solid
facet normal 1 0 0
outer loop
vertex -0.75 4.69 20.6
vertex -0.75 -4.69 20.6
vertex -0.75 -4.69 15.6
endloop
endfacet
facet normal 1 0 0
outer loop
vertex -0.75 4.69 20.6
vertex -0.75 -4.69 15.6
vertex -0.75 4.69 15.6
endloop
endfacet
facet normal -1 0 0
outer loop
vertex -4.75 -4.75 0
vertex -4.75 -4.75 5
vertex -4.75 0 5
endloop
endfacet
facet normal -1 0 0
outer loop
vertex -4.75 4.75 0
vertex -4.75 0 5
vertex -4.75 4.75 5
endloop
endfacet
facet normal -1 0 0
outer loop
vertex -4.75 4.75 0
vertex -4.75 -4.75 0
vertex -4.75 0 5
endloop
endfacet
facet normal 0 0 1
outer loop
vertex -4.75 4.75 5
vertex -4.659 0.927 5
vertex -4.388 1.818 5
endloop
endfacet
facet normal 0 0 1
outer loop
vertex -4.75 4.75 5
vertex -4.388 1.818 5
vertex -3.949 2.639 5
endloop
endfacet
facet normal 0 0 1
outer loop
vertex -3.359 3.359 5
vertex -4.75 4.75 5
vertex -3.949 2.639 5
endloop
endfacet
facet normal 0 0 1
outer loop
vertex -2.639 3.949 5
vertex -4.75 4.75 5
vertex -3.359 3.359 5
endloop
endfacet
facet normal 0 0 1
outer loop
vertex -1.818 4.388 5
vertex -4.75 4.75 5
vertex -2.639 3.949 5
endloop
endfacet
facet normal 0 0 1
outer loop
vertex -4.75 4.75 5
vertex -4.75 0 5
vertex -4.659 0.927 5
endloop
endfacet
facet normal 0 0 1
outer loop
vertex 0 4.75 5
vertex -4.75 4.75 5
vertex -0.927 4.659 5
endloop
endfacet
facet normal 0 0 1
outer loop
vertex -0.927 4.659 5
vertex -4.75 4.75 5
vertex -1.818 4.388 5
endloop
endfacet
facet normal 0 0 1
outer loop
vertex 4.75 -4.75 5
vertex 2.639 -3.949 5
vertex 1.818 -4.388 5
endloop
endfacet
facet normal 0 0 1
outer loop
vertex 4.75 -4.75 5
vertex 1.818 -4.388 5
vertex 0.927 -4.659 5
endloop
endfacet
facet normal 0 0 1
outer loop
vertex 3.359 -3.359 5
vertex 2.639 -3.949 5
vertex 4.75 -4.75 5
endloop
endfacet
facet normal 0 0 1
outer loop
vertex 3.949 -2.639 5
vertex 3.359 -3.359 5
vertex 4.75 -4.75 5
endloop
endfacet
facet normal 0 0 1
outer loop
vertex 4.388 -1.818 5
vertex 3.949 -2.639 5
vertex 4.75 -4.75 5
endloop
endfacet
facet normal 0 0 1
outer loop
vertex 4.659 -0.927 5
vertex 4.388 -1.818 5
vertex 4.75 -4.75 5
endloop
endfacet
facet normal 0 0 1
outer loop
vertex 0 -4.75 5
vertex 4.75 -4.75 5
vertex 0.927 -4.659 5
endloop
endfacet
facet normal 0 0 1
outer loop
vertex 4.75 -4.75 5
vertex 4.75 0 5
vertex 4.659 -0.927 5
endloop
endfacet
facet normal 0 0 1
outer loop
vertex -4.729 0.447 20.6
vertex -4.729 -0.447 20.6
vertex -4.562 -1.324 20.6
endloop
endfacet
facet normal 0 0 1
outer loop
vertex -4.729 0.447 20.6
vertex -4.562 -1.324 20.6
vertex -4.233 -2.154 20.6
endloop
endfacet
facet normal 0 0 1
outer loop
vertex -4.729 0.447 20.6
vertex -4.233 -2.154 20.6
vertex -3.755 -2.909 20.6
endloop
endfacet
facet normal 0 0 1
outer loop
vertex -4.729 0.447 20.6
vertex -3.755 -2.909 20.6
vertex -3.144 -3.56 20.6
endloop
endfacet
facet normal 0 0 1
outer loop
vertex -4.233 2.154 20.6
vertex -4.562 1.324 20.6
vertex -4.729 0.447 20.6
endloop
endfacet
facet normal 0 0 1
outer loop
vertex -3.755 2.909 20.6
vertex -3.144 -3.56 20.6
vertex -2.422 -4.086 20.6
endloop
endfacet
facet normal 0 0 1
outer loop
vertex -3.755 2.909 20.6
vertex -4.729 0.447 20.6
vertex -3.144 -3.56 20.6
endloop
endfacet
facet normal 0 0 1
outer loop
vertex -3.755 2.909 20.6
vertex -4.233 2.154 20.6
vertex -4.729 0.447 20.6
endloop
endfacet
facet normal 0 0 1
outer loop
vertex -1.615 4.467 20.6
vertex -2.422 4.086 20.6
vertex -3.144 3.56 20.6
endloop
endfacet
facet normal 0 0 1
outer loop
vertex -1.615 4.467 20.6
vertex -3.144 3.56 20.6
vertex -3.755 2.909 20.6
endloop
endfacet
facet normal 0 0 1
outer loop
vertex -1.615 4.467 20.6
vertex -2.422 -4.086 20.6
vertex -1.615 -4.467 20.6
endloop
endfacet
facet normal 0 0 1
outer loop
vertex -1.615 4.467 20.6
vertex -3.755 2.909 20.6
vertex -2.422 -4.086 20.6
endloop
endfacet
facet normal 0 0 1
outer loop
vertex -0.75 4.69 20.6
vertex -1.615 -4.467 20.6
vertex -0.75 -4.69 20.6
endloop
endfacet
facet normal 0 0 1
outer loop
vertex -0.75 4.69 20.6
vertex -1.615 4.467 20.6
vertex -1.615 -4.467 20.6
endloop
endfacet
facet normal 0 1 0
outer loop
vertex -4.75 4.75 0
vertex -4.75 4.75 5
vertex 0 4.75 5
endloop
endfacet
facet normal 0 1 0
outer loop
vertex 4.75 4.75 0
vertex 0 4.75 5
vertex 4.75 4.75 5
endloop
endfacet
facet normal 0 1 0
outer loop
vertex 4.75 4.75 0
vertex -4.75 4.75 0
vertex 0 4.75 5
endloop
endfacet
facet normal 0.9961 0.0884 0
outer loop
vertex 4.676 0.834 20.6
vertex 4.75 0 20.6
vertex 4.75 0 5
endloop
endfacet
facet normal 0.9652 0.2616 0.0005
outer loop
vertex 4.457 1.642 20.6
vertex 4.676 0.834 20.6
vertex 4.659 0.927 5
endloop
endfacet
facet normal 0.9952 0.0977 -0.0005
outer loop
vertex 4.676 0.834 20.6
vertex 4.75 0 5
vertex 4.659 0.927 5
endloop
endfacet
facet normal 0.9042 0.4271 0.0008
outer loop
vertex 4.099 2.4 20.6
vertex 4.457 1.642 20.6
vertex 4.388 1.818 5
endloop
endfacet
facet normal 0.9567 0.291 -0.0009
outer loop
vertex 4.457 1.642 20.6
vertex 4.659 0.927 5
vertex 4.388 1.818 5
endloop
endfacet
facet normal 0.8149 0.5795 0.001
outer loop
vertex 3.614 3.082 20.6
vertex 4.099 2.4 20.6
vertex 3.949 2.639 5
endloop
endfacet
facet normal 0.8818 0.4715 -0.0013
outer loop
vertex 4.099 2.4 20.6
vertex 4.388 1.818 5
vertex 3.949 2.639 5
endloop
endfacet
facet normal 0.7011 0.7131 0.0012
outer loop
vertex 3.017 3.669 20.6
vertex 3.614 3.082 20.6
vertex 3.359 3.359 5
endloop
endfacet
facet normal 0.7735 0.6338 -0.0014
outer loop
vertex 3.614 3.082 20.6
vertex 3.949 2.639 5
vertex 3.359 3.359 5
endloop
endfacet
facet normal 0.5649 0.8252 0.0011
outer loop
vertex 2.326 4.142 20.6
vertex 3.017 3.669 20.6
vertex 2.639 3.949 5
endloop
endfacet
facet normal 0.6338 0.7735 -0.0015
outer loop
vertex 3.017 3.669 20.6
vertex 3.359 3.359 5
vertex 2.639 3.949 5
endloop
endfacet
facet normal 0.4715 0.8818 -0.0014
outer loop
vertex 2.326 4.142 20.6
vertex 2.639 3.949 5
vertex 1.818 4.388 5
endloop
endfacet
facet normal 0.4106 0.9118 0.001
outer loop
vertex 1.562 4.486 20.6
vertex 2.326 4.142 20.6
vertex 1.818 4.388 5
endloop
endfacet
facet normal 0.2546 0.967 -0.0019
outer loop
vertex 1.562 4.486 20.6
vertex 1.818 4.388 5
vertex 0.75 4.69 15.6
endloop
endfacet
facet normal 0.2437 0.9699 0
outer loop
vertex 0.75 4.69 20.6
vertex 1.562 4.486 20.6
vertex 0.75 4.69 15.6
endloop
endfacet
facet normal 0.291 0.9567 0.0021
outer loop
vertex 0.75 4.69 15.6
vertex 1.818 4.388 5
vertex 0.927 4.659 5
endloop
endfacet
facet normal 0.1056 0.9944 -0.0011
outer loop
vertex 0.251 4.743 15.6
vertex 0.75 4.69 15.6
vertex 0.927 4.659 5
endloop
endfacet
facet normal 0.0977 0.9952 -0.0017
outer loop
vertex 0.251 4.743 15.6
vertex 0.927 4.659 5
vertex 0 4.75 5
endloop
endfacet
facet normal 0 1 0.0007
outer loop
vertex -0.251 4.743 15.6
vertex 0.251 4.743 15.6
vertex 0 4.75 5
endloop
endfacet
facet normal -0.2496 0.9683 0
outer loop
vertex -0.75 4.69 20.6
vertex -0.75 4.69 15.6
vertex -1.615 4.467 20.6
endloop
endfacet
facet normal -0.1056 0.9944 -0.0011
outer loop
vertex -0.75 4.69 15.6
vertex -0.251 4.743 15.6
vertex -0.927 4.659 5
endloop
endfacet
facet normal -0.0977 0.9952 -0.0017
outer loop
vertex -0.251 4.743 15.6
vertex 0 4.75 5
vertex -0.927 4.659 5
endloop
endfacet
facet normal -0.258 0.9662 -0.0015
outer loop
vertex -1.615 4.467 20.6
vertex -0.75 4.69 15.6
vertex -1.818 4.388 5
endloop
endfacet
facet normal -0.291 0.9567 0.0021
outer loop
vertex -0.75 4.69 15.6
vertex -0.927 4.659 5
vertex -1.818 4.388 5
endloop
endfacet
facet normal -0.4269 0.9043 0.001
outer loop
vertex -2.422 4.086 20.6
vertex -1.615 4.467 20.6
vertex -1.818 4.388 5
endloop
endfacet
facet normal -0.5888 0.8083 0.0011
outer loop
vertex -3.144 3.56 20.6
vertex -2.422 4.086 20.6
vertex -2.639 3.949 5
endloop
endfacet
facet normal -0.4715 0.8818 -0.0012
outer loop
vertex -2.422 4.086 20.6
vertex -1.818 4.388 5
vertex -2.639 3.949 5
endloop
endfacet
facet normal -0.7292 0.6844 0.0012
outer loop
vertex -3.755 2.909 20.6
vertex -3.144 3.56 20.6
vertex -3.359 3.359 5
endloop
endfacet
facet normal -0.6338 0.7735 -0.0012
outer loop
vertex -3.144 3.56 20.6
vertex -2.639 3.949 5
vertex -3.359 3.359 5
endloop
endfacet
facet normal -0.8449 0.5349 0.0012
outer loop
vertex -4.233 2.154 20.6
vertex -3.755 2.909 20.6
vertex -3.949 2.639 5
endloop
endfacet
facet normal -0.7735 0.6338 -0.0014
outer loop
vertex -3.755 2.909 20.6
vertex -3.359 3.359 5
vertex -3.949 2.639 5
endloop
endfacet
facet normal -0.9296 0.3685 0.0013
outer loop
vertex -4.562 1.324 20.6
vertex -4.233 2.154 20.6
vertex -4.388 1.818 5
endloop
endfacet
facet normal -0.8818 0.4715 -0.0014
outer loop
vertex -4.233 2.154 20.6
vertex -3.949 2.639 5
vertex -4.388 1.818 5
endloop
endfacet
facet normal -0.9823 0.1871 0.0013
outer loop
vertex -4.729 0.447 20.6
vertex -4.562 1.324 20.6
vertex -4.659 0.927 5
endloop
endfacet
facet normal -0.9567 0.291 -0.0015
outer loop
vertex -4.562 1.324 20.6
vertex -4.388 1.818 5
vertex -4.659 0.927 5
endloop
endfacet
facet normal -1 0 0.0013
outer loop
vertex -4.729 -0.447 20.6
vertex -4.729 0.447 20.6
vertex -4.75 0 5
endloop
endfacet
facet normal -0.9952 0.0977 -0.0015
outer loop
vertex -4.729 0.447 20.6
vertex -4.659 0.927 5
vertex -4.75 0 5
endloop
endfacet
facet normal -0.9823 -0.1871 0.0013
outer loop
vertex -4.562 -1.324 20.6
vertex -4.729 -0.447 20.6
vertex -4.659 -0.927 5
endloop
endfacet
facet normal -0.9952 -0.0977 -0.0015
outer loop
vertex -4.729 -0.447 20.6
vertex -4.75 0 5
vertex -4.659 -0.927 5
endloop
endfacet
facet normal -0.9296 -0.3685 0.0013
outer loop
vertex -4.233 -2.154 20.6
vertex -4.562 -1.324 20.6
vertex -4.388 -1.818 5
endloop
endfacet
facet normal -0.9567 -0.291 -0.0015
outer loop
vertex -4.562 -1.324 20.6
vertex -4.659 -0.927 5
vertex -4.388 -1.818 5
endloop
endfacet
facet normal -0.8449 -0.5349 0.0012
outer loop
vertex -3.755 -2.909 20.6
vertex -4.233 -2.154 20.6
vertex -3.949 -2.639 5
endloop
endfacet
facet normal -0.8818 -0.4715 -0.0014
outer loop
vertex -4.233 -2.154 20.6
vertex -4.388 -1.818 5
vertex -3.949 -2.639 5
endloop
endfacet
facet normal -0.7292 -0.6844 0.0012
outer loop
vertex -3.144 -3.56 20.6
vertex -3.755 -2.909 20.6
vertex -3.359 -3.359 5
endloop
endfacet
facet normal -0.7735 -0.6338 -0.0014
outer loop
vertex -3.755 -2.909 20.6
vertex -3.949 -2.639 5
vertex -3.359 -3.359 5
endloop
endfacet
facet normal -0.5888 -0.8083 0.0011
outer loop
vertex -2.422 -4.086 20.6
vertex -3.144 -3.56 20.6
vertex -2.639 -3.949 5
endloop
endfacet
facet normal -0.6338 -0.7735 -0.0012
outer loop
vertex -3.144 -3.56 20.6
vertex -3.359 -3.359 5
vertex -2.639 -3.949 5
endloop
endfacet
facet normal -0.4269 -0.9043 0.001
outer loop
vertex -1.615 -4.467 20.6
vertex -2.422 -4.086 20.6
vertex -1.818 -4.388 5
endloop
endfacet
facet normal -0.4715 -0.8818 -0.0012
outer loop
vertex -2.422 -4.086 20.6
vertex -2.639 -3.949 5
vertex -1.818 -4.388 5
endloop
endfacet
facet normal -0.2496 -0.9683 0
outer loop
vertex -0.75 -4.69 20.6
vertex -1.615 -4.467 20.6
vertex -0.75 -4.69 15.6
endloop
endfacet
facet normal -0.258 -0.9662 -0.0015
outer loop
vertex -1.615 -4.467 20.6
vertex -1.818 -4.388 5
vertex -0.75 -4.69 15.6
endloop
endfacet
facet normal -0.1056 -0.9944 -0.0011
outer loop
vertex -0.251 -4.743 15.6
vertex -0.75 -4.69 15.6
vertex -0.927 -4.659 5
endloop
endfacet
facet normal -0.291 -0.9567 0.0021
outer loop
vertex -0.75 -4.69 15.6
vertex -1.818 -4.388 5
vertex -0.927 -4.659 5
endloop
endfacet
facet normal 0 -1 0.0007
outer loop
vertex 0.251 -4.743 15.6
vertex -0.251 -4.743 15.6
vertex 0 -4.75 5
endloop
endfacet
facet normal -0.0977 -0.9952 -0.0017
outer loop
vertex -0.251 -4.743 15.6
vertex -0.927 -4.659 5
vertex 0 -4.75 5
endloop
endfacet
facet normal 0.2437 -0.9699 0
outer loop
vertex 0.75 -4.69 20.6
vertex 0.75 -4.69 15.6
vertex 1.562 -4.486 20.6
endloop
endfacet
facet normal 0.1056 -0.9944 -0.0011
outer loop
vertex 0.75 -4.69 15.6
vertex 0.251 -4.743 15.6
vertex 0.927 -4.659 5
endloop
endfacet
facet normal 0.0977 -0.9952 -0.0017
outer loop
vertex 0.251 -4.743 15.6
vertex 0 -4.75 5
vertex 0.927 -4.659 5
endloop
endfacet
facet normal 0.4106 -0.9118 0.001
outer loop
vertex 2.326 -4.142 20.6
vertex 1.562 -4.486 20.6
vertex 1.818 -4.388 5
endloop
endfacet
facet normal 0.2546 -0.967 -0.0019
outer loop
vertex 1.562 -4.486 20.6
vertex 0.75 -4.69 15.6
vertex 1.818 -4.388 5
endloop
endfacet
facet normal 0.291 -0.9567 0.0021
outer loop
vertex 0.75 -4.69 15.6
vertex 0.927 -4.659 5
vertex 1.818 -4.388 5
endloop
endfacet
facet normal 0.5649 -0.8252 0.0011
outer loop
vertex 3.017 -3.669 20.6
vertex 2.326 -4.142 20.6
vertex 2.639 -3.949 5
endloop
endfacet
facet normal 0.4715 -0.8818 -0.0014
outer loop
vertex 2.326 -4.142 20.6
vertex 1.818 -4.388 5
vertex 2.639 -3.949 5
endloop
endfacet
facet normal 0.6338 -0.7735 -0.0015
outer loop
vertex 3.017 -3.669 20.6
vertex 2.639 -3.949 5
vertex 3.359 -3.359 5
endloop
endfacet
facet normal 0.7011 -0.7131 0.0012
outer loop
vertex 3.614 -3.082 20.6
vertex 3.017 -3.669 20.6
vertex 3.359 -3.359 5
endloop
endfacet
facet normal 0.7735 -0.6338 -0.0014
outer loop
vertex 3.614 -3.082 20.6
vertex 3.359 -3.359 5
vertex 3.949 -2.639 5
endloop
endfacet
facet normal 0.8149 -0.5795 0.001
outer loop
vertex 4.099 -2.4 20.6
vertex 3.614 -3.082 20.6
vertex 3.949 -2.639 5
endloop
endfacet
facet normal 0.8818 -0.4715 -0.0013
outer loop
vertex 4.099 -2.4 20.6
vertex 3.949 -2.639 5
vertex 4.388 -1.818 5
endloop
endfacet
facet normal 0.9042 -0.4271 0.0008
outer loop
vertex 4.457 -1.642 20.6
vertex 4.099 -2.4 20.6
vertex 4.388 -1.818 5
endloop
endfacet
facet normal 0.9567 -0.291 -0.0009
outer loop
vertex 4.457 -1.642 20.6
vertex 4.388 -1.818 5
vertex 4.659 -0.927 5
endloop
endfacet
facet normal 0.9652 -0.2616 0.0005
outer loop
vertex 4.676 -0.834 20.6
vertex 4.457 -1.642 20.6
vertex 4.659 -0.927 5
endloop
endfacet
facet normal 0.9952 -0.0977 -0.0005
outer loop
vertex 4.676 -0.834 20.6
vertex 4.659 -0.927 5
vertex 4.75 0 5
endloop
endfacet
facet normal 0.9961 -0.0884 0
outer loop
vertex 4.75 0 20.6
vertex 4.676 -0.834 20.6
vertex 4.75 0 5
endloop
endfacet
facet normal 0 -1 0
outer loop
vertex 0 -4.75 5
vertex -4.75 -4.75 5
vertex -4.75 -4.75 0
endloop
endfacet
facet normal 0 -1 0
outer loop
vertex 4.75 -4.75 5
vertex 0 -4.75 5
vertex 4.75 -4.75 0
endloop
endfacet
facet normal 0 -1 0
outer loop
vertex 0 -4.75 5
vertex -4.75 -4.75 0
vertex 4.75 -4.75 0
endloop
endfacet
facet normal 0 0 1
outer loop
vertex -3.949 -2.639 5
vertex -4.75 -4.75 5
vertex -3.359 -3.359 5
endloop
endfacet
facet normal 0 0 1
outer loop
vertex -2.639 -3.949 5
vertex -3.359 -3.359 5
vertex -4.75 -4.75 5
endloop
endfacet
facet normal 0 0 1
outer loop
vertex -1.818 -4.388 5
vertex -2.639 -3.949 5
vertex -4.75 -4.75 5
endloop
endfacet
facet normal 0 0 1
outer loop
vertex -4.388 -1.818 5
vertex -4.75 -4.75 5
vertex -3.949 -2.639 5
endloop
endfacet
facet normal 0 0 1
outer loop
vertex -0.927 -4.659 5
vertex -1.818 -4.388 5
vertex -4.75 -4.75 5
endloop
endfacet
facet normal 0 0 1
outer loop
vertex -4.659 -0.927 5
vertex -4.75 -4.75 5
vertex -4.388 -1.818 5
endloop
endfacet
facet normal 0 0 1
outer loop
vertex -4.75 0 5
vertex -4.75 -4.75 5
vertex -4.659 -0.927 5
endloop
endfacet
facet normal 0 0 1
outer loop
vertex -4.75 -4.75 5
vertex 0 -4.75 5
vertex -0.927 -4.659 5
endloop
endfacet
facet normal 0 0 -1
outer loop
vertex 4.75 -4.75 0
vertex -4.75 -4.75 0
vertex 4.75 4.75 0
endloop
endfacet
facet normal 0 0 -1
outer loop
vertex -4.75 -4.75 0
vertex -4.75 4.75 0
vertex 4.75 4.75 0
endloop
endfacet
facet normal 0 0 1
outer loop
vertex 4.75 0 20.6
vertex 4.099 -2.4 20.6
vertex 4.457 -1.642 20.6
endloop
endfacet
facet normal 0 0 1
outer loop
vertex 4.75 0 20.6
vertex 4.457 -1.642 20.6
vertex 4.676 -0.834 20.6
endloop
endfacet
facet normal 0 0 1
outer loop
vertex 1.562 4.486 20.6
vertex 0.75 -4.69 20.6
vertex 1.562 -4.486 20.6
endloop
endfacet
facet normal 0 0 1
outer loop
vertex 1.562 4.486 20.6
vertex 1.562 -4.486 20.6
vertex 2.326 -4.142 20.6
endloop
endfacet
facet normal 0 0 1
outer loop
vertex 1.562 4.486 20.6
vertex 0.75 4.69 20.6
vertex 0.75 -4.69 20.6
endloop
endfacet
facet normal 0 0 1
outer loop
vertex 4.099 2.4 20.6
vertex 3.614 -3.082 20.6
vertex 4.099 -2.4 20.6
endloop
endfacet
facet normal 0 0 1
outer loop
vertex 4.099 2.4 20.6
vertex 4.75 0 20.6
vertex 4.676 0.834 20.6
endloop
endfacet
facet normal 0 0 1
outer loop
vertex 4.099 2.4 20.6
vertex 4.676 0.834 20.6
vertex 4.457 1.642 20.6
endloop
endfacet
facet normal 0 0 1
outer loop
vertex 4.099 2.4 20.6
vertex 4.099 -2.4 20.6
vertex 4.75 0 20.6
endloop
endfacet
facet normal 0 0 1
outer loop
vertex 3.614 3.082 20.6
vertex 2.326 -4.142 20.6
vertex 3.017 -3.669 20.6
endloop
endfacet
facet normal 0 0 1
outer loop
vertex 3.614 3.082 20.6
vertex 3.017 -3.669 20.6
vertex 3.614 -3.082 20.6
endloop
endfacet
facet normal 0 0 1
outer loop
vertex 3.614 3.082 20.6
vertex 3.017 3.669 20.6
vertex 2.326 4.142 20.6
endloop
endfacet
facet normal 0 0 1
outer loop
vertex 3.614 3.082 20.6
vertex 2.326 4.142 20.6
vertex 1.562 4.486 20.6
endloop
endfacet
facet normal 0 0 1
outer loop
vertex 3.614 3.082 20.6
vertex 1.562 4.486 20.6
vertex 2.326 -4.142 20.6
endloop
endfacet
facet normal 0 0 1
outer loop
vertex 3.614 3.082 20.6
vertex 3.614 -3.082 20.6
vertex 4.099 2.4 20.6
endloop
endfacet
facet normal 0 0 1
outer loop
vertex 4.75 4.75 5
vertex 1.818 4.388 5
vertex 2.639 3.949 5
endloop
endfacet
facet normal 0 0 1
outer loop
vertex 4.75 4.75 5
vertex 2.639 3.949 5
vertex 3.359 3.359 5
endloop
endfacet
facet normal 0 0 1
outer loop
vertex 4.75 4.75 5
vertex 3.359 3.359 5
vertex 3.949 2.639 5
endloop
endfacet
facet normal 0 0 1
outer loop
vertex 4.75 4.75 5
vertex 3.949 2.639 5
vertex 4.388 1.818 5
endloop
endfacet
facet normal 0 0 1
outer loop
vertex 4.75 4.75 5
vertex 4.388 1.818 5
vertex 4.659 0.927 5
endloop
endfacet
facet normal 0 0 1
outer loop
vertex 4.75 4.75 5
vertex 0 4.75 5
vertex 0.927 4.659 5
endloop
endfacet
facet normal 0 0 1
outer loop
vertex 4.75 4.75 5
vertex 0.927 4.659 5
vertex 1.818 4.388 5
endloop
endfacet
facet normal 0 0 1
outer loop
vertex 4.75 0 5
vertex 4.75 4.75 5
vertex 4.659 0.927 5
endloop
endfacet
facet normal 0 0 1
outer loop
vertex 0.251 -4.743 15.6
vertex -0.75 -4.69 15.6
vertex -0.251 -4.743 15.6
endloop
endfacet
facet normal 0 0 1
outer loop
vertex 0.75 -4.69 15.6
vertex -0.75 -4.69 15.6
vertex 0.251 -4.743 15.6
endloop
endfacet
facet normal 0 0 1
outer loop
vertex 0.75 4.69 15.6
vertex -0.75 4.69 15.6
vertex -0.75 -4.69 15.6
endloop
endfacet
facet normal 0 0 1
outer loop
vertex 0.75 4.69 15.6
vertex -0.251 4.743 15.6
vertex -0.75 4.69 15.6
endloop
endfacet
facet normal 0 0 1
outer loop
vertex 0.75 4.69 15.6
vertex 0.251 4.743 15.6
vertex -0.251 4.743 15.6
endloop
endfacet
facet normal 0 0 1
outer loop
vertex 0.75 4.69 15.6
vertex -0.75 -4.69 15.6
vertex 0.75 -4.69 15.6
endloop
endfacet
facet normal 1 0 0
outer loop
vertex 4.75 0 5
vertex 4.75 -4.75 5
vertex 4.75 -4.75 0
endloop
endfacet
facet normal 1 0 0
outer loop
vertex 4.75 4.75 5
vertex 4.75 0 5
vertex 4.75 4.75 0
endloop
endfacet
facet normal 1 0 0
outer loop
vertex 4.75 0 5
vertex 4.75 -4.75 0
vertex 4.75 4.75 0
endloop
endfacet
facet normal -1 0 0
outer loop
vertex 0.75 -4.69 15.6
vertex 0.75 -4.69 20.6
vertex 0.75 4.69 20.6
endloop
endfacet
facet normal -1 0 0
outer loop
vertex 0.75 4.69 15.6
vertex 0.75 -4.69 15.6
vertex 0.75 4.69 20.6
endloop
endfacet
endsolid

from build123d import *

# Parameters (mm, degrees)
F0_R     = 4.75
F1_DEPTH = 20.6
F3_W     = 1.5
F3_H     = 10.714468
F4_DEPTH = 5
F5_W     = 9.5
F5_H     = 9.5
F6_DEPTH = 5


with BuildPart() as f1:
    # F0 (on Top) → F1 (new body)
    with BuildSketch(Plane.XY):
        Circle(F0_R)
    extrude(amount=F1_DEPTH)

    # F3 (on offset) → F4 (cut)
    with BuildSketch(Plane.XY.offset(20.6)):
        Rectangle(F3_W, F3_H)
    extrude(amount=-F4_DEPTH, mode=Mode.SUBTRACT)

    # F5 (on Top) → F6 (join)
    with BuildSketch(Plane.XY):
        Rectangle(F5_W, F5_H)
    extrude(amount=F6_DEPTH)


solid = f1.part
